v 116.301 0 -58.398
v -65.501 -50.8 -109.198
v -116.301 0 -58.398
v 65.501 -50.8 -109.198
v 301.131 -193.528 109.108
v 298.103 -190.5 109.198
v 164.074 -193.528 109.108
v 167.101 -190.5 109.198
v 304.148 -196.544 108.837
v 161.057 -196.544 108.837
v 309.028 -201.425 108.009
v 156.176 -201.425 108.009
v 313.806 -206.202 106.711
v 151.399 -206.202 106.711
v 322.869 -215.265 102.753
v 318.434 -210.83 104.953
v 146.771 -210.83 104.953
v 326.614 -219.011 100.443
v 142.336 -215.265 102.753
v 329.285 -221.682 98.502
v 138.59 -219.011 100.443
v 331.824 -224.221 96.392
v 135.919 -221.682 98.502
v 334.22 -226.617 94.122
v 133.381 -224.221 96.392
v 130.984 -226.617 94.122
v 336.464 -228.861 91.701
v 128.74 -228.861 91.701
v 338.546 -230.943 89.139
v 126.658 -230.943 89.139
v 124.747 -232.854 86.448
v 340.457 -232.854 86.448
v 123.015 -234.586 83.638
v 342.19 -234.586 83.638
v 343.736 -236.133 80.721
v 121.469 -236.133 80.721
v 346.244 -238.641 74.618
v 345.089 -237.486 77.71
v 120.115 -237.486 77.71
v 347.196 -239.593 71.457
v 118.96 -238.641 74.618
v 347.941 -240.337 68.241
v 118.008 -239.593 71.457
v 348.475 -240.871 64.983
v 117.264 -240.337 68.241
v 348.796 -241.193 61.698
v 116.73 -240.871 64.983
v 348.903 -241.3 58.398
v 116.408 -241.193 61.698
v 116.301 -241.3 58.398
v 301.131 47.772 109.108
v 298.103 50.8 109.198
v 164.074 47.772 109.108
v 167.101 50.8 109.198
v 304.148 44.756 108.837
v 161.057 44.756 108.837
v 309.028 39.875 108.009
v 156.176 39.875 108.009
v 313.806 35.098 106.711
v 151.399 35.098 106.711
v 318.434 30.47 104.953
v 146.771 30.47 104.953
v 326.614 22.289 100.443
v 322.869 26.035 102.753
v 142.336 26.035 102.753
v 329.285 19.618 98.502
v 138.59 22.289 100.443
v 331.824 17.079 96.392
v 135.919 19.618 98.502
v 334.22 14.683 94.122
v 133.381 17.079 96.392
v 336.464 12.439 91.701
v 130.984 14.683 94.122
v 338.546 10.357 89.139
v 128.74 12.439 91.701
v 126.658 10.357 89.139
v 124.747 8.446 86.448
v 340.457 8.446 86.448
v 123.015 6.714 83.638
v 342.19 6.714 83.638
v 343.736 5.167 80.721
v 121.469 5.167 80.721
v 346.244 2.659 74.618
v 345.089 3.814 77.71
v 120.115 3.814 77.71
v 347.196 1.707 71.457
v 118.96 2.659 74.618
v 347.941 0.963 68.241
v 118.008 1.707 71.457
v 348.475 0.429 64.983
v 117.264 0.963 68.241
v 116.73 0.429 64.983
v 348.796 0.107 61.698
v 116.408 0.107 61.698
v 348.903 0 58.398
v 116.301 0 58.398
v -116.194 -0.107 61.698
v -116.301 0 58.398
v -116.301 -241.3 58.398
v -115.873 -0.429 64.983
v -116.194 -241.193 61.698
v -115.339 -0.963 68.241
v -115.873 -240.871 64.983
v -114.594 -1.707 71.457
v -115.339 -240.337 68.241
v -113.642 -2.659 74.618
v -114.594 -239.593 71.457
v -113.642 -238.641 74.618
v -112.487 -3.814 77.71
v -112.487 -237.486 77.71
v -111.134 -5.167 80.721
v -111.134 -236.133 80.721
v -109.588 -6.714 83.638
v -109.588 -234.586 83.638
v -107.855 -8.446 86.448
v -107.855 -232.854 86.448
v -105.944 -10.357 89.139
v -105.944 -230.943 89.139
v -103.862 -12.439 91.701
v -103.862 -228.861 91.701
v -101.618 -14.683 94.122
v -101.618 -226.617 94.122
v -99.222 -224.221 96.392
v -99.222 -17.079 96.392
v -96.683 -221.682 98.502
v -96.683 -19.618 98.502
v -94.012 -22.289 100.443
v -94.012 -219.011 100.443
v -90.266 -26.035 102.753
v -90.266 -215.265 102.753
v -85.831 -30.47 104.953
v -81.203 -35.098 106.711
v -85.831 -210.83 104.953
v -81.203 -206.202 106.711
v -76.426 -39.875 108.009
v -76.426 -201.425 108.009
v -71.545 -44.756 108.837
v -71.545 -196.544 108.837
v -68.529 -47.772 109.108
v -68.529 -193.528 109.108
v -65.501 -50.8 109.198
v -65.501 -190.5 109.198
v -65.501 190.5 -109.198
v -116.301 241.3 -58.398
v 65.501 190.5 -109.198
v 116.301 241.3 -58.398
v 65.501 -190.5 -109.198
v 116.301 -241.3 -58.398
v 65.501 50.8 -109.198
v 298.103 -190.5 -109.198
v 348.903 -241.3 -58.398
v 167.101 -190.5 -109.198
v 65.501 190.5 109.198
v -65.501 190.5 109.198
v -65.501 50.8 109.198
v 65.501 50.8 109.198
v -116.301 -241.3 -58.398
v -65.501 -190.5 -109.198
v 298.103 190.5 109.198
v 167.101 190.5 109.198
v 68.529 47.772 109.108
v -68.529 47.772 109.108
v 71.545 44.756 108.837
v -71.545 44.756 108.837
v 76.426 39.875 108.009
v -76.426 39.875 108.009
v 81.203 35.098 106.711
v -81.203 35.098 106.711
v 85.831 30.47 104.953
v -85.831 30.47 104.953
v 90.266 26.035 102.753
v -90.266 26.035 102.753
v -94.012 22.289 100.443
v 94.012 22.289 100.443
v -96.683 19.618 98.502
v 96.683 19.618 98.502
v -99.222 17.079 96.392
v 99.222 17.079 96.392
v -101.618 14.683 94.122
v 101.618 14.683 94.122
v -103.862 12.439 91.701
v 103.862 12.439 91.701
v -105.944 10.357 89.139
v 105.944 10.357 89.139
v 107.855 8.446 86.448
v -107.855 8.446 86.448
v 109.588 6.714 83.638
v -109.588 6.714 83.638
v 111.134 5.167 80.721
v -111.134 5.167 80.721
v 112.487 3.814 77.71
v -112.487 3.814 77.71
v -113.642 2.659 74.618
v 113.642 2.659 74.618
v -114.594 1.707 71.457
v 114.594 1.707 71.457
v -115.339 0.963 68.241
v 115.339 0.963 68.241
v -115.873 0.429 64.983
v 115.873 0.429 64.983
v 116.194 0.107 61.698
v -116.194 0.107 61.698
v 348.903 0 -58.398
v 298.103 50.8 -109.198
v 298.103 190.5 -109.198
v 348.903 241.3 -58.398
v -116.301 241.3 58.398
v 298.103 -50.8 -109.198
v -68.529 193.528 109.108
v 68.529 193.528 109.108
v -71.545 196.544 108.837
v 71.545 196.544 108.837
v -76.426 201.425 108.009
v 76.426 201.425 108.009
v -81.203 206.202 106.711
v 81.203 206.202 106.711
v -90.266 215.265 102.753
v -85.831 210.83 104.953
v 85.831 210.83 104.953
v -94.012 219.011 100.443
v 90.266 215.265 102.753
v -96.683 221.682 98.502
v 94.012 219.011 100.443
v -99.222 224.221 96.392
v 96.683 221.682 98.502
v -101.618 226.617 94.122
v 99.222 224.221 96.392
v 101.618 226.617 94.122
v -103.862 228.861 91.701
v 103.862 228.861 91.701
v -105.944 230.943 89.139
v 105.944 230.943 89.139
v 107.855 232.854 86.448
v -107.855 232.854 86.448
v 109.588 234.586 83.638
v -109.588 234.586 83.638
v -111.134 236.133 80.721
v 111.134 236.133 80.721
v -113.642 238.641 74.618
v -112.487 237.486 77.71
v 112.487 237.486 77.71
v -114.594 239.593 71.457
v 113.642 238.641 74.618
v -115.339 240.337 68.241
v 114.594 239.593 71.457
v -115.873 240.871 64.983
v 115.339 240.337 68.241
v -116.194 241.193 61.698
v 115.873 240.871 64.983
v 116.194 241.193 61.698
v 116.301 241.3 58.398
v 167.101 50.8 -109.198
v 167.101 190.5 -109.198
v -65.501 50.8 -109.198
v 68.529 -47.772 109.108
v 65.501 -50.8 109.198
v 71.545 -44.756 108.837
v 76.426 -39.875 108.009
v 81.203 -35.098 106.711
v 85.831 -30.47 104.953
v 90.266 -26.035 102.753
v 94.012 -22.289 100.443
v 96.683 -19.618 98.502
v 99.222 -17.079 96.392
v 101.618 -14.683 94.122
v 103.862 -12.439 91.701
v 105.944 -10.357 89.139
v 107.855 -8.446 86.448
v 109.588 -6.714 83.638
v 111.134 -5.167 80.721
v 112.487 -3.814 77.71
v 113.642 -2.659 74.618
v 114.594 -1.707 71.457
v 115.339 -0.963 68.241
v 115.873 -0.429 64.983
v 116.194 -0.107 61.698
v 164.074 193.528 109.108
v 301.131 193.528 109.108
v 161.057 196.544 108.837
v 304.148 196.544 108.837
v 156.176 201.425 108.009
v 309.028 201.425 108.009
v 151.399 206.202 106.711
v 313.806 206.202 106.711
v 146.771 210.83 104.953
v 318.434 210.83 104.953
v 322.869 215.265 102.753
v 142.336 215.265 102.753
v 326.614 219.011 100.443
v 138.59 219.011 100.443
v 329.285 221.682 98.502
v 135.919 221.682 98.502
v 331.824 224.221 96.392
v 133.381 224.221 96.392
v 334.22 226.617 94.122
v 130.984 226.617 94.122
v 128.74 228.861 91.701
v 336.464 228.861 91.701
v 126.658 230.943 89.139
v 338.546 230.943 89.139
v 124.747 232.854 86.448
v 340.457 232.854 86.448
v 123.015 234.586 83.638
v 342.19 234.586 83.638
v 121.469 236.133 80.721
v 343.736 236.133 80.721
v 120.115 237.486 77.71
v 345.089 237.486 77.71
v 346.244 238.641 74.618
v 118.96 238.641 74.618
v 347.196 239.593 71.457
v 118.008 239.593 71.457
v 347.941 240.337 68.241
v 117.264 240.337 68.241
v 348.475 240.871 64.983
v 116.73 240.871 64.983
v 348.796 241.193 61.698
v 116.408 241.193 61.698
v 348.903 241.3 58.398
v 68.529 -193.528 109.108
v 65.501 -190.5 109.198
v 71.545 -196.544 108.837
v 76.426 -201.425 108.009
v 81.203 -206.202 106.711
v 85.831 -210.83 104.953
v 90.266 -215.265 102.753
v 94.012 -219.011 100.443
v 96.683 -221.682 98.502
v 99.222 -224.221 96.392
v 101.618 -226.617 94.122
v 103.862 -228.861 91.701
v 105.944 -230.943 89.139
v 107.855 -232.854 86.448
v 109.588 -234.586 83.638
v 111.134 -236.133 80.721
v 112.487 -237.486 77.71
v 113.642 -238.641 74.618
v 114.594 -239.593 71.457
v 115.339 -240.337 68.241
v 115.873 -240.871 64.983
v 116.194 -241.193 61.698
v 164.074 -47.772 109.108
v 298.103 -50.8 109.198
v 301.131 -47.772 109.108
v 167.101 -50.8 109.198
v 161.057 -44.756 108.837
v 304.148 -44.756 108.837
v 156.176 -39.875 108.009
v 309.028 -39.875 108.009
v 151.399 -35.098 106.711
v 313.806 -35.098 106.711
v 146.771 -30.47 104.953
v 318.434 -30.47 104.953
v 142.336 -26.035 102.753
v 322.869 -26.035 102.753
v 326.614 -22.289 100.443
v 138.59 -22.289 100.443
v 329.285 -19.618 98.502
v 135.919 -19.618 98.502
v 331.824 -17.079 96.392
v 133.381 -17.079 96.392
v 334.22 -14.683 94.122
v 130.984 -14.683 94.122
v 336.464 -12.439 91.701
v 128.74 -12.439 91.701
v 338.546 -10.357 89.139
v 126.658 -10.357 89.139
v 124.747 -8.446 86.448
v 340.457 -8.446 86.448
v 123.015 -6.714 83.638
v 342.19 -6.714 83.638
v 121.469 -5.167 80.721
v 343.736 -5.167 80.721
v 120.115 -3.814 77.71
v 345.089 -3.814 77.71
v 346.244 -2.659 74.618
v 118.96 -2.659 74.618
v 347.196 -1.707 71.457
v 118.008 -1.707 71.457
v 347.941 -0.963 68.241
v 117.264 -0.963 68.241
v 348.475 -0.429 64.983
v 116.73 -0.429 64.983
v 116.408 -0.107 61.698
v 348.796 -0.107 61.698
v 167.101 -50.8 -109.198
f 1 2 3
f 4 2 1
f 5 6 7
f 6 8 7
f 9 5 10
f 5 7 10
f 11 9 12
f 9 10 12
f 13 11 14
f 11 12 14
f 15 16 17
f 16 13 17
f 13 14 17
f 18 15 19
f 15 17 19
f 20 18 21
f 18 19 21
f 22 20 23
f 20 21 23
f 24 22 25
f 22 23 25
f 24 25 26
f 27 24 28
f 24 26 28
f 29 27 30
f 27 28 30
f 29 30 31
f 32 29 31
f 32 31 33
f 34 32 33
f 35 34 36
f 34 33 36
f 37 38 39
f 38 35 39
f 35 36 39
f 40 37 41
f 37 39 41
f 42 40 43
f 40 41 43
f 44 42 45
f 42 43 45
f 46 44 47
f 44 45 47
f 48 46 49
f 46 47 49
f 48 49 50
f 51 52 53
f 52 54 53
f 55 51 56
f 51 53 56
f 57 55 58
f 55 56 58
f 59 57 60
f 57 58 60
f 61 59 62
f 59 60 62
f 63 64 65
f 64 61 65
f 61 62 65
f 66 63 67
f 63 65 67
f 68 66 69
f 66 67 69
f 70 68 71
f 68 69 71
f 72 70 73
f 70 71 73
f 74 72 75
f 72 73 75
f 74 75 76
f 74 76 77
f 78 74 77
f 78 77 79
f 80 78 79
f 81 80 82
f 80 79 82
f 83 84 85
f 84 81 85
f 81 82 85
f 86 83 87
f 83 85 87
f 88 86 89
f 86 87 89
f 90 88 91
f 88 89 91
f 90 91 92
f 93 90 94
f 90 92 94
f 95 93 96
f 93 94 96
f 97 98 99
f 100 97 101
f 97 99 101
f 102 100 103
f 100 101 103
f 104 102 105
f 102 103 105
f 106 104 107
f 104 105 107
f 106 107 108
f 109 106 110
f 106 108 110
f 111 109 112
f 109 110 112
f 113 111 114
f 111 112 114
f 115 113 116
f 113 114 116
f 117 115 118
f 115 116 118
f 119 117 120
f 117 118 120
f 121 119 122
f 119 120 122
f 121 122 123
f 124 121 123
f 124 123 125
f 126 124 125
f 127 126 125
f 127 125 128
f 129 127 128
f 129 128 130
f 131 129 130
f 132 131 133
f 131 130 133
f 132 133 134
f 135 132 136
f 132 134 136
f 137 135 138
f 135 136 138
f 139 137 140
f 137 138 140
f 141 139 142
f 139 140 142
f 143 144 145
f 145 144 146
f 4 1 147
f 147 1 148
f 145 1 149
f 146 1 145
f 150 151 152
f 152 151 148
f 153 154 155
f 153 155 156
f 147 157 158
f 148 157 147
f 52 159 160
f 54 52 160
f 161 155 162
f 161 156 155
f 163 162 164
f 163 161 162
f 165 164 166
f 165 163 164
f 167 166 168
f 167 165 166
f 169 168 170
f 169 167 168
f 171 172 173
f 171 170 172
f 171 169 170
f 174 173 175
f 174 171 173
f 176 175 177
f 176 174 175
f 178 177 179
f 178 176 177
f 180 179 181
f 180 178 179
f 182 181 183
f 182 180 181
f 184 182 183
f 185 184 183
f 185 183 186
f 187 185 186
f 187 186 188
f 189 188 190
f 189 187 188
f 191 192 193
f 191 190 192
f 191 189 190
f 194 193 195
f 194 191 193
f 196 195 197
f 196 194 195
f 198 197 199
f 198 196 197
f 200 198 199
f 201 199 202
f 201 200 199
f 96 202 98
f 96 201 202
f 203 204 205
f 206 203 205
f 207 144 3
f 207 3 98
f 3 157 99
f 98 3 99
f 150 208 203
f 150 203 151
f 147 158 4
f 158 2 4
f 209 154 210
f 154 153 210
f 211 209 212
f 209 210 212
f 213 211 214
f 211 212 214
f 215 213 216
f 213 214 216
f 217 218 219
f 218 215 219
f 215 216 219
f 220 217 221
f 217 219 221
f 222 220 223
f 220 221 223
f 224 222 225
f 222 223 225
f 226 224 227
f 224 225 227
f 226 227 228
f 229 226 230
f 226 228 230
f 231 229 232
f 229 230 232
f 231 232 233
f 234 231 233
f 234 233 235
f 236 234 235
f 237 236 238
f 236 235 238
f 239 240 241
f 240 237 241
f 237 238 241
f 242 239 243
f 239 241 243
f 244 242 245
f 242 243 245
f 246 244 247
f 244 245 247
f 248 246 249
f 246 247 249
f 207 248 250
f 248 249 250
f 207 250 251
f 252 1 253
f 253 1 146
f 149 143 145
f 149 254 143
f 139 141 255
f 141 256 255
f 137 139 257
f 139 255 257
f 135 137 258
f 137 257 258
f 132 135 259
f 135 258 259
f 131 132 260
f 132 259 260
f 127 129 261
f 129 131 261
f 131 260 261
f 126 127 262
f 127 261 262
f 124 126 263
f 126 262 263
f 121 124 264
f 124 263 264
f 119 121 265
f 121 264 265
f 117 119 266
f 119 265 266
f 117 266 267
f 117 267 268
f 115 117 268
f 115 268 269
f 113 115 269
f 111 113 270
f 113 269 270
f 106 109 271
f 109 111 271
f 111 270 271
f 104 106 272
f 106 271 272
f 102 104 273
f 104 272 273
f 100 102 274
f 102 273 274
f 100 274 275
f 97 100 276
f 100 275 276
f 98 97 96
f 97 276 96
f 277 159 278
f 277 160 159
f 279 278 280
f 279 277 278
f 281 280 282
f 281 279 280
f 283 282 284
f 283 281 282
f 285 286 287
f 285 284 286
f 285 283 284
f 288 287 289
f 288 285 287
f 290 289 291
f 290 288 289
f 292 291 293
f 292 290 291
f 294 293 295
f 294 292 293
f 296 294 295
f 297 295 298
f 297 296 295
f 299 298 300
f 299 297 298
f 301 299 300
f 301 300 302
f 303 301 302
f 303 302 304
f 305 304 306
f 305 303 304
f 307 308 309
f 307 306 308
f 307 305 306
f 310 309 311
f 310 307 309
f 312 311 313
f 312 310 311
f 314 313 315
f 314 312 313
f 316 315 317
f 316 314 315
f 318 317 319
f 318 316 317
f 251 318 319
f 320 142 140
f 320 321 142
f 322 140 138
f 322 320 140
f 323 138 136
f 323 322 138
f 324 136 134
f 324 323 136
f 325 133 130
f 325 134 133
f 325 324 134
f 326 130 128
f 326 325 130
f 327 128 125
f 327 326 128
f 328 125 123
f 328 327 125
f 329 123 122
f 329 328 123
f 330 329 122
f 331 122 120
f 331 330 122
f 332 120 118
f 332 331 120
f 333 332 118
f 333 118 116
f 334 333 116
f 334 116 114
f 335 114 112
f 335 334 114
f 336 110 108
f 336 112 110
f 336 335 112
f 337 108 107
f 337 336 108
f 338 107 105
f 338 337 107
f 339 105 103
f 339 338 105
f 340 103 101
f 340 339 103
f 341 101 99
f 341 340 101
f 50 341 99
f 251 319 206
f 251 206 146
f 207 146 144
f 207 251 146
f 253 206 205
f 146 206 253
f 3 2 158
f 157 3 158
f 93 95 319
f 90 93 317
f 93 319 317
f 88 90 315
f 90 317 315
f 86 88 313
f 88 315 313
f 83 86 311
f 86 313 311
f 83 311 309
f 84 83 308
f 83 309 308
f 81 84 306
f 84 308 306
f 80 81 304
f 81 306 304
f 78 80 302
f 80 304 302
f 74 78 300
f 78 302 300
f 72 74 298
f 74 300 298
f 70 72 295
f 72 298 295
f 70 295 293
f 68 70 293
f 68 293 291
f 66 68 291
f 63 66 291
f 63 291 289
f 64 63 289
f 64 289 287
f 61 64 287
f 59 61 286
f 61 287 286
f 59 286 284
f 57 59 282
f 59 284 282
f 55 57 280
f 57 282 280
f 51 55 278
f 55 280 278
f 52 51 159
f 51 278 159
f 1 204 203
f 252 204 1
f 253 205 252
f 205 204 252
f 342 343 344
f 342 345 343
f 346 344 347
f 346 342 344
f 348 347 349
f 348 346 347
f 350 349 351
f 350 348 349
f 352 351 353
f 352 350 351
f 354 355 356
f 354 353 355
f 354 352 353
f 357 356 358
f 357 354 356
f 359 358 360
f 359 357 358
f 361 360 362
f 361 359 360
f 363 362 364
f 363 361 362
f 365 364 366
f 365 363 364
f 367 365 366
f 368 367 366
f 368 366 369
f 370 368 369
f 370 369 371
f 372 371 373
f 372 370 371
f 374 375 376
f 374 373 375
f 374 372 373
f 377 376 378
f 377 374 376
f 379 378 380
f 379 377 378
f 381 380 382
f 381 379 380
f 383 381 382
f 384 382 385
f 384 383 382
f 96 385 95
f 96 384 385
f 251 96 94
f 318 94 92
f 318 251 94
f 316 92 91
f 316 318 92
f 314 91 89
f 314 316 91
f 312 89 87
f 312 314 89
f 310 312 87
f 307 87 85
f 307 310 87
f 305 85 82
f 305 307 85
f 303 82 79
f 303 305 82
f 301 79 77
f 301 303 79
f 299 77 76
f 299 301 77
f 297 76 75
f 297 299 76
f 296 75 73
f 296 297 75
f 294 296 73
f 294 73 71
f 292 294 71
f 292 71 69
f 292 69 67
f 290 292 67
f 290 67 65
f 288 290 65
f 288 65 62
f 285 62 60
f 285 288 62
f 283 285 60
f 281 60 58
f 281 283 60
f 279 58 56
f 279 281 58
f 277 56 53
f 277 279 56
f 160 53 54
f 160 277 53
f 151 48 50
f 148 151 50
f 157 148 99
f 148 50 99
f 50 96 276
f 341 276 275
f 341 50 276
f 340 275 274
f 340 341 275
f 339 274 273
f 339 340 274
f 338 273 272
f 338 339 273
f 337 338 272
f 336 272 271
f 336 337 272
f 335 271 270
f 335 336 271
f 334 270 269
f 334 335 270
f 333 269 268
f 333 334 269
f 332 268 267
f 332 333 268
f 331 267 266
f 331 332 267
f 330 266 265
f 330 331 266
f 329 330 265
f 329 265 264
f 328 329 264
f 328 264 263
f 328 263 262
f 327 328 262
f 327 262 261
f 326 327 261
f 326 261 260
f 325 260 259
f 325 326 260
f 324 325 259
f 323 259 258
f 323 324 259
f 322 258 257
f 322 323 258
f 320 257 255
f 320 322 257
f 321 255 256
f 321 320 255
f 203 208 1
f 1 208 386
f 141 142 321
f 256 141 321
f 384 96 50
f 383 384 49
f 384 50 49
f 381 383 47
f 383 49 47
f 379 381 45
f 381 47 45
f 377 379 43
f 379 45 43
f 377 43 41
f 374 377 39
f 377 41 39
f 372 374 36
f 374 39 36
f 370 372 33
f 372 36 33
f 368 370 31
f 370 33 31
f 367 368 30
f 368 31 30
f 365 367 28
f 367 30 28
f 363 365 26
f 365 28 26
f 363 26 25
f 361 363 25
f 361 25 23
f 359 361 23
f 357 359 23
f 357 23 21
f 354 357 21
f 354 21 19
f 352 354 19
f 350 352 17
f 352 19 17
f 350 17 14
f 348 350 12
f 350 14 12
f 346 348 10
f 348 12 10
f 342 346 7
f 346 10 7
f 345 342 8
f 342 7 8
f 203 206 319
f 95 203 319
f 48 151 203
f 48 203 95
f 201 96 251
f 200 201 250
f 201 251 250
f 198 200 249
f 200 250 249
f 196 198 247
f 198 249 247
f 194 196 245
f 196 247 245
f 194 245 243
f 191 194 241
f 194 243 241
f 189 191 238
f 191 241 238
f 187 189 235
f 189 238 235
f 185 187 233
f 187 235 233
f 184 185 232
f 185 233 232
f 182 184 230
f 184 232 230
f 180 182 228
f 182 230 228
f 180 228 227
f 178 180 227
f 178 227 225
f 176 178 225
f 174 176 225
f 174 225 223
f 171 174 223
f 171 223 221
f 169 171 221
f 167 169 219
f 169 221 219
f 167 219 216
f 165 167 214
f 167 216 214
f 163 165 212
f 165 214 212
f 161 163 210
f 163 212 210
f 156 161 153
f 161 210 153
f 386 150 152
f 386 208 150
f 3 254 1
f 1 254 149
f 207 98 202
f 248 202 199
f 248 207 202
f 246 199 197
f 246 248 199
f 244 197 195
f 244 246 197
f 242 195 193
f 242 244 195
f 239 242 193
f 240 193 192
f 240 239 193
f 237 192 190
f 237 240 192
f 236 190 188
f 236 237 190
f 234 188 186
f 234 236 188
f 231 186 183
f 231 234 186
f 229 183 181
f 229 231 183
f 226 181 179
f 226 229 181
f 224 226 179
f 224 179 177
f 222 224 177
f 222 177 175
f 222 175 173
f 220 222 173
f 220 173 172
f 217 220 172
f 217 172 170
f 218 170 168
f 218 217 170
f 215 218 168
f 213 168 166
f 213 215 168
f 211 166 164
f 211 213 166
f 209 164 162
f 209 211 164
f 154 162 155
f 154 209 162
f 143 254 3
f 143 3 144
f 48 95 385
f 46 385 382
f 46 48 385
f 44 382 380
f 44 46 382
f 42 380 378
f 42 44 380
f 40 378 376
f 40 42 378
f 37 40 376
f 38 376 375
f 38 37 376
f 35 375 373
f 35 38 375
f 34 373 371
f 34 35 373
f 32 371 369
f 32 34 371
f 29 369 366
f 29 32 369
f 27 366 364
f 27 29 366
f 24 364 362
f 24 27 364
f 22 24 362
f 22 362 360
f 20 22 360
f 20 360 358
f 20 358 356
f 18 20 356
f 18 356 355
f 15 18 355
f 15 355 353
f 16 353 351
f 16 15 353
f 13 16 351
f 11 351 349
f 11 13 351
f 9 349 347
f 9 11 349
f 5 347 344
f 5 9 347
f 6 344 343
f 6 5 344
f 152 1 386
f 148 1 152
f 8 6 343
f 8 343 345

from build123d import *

# Parameters (mm, degrees)
F0_W     = 232.602224
F0_H     = 218.396396
F1_DEPTH = 241.3
F2_R     = 50.8
F3_SIZE  = 50.8
F4_SIZE  = 50.8
F5_SIZE  = 50.8


with BuildPart() as f1:
    # F0 (on Front) → F1 (new body)
    with BuildSketch(Plane.XZ):
        Rectangle(F0_W, F0_H)
    extrude(amount=F1_DEPTH)

    # F2
    f2_edges = [f1.edges().sort_by_distance(p)[0] for p in [
        (116.301112, -120.65, 109.198198),
        (-116.301112, -120.65, 109.198198),
        (0, 0, 109.198198),
        (0, -241.3, 109.198198),
    ]]
    fillet(f2_edges, radius=F2_R)

    # F3
    f3_edges = [f1.edges().sort_by_distance(p)[0] for p in [
        (0, -241.3, -109.198198),
    ]]
    chamfer(f3_edges, length=F3_SIZE)

    # F4
    f4_edges = [f1.edges().sort_by_distance(p)[0] for p in [
        (-116.301112, -95.25, -109.198198),
    ]]
    chamfer(f4_edges, length=F4_SIZE)

    # F5
    f5_edges = [f1.edges().sort_by_distance(p)[0] for p in [
        (25.4, 0, -109.198198),
        (116.301112, -95.25, -109.198198),
    ]]
    chamfer(f5_edges, length=F5_SIZE)

    # F6: F1 across face


with BuildPart() as f1_1:
    add(f1.part)
    add(f1.part.mirror(Plane(origin=(116.301112, -120.65, 0), x_dir=(0, 1, 0), z_dir=(1, 0, 0))))

    # F7: F1 across face


with BuildPart() as f1_2:
    add(f1_1.part)
    add(f1_1.part.mirror(Plane(origin=(116.301112, 0, 0), x_dir=(1, 0, 0), z_dir=(0, 1, 0))))


solid = f1_2.part
